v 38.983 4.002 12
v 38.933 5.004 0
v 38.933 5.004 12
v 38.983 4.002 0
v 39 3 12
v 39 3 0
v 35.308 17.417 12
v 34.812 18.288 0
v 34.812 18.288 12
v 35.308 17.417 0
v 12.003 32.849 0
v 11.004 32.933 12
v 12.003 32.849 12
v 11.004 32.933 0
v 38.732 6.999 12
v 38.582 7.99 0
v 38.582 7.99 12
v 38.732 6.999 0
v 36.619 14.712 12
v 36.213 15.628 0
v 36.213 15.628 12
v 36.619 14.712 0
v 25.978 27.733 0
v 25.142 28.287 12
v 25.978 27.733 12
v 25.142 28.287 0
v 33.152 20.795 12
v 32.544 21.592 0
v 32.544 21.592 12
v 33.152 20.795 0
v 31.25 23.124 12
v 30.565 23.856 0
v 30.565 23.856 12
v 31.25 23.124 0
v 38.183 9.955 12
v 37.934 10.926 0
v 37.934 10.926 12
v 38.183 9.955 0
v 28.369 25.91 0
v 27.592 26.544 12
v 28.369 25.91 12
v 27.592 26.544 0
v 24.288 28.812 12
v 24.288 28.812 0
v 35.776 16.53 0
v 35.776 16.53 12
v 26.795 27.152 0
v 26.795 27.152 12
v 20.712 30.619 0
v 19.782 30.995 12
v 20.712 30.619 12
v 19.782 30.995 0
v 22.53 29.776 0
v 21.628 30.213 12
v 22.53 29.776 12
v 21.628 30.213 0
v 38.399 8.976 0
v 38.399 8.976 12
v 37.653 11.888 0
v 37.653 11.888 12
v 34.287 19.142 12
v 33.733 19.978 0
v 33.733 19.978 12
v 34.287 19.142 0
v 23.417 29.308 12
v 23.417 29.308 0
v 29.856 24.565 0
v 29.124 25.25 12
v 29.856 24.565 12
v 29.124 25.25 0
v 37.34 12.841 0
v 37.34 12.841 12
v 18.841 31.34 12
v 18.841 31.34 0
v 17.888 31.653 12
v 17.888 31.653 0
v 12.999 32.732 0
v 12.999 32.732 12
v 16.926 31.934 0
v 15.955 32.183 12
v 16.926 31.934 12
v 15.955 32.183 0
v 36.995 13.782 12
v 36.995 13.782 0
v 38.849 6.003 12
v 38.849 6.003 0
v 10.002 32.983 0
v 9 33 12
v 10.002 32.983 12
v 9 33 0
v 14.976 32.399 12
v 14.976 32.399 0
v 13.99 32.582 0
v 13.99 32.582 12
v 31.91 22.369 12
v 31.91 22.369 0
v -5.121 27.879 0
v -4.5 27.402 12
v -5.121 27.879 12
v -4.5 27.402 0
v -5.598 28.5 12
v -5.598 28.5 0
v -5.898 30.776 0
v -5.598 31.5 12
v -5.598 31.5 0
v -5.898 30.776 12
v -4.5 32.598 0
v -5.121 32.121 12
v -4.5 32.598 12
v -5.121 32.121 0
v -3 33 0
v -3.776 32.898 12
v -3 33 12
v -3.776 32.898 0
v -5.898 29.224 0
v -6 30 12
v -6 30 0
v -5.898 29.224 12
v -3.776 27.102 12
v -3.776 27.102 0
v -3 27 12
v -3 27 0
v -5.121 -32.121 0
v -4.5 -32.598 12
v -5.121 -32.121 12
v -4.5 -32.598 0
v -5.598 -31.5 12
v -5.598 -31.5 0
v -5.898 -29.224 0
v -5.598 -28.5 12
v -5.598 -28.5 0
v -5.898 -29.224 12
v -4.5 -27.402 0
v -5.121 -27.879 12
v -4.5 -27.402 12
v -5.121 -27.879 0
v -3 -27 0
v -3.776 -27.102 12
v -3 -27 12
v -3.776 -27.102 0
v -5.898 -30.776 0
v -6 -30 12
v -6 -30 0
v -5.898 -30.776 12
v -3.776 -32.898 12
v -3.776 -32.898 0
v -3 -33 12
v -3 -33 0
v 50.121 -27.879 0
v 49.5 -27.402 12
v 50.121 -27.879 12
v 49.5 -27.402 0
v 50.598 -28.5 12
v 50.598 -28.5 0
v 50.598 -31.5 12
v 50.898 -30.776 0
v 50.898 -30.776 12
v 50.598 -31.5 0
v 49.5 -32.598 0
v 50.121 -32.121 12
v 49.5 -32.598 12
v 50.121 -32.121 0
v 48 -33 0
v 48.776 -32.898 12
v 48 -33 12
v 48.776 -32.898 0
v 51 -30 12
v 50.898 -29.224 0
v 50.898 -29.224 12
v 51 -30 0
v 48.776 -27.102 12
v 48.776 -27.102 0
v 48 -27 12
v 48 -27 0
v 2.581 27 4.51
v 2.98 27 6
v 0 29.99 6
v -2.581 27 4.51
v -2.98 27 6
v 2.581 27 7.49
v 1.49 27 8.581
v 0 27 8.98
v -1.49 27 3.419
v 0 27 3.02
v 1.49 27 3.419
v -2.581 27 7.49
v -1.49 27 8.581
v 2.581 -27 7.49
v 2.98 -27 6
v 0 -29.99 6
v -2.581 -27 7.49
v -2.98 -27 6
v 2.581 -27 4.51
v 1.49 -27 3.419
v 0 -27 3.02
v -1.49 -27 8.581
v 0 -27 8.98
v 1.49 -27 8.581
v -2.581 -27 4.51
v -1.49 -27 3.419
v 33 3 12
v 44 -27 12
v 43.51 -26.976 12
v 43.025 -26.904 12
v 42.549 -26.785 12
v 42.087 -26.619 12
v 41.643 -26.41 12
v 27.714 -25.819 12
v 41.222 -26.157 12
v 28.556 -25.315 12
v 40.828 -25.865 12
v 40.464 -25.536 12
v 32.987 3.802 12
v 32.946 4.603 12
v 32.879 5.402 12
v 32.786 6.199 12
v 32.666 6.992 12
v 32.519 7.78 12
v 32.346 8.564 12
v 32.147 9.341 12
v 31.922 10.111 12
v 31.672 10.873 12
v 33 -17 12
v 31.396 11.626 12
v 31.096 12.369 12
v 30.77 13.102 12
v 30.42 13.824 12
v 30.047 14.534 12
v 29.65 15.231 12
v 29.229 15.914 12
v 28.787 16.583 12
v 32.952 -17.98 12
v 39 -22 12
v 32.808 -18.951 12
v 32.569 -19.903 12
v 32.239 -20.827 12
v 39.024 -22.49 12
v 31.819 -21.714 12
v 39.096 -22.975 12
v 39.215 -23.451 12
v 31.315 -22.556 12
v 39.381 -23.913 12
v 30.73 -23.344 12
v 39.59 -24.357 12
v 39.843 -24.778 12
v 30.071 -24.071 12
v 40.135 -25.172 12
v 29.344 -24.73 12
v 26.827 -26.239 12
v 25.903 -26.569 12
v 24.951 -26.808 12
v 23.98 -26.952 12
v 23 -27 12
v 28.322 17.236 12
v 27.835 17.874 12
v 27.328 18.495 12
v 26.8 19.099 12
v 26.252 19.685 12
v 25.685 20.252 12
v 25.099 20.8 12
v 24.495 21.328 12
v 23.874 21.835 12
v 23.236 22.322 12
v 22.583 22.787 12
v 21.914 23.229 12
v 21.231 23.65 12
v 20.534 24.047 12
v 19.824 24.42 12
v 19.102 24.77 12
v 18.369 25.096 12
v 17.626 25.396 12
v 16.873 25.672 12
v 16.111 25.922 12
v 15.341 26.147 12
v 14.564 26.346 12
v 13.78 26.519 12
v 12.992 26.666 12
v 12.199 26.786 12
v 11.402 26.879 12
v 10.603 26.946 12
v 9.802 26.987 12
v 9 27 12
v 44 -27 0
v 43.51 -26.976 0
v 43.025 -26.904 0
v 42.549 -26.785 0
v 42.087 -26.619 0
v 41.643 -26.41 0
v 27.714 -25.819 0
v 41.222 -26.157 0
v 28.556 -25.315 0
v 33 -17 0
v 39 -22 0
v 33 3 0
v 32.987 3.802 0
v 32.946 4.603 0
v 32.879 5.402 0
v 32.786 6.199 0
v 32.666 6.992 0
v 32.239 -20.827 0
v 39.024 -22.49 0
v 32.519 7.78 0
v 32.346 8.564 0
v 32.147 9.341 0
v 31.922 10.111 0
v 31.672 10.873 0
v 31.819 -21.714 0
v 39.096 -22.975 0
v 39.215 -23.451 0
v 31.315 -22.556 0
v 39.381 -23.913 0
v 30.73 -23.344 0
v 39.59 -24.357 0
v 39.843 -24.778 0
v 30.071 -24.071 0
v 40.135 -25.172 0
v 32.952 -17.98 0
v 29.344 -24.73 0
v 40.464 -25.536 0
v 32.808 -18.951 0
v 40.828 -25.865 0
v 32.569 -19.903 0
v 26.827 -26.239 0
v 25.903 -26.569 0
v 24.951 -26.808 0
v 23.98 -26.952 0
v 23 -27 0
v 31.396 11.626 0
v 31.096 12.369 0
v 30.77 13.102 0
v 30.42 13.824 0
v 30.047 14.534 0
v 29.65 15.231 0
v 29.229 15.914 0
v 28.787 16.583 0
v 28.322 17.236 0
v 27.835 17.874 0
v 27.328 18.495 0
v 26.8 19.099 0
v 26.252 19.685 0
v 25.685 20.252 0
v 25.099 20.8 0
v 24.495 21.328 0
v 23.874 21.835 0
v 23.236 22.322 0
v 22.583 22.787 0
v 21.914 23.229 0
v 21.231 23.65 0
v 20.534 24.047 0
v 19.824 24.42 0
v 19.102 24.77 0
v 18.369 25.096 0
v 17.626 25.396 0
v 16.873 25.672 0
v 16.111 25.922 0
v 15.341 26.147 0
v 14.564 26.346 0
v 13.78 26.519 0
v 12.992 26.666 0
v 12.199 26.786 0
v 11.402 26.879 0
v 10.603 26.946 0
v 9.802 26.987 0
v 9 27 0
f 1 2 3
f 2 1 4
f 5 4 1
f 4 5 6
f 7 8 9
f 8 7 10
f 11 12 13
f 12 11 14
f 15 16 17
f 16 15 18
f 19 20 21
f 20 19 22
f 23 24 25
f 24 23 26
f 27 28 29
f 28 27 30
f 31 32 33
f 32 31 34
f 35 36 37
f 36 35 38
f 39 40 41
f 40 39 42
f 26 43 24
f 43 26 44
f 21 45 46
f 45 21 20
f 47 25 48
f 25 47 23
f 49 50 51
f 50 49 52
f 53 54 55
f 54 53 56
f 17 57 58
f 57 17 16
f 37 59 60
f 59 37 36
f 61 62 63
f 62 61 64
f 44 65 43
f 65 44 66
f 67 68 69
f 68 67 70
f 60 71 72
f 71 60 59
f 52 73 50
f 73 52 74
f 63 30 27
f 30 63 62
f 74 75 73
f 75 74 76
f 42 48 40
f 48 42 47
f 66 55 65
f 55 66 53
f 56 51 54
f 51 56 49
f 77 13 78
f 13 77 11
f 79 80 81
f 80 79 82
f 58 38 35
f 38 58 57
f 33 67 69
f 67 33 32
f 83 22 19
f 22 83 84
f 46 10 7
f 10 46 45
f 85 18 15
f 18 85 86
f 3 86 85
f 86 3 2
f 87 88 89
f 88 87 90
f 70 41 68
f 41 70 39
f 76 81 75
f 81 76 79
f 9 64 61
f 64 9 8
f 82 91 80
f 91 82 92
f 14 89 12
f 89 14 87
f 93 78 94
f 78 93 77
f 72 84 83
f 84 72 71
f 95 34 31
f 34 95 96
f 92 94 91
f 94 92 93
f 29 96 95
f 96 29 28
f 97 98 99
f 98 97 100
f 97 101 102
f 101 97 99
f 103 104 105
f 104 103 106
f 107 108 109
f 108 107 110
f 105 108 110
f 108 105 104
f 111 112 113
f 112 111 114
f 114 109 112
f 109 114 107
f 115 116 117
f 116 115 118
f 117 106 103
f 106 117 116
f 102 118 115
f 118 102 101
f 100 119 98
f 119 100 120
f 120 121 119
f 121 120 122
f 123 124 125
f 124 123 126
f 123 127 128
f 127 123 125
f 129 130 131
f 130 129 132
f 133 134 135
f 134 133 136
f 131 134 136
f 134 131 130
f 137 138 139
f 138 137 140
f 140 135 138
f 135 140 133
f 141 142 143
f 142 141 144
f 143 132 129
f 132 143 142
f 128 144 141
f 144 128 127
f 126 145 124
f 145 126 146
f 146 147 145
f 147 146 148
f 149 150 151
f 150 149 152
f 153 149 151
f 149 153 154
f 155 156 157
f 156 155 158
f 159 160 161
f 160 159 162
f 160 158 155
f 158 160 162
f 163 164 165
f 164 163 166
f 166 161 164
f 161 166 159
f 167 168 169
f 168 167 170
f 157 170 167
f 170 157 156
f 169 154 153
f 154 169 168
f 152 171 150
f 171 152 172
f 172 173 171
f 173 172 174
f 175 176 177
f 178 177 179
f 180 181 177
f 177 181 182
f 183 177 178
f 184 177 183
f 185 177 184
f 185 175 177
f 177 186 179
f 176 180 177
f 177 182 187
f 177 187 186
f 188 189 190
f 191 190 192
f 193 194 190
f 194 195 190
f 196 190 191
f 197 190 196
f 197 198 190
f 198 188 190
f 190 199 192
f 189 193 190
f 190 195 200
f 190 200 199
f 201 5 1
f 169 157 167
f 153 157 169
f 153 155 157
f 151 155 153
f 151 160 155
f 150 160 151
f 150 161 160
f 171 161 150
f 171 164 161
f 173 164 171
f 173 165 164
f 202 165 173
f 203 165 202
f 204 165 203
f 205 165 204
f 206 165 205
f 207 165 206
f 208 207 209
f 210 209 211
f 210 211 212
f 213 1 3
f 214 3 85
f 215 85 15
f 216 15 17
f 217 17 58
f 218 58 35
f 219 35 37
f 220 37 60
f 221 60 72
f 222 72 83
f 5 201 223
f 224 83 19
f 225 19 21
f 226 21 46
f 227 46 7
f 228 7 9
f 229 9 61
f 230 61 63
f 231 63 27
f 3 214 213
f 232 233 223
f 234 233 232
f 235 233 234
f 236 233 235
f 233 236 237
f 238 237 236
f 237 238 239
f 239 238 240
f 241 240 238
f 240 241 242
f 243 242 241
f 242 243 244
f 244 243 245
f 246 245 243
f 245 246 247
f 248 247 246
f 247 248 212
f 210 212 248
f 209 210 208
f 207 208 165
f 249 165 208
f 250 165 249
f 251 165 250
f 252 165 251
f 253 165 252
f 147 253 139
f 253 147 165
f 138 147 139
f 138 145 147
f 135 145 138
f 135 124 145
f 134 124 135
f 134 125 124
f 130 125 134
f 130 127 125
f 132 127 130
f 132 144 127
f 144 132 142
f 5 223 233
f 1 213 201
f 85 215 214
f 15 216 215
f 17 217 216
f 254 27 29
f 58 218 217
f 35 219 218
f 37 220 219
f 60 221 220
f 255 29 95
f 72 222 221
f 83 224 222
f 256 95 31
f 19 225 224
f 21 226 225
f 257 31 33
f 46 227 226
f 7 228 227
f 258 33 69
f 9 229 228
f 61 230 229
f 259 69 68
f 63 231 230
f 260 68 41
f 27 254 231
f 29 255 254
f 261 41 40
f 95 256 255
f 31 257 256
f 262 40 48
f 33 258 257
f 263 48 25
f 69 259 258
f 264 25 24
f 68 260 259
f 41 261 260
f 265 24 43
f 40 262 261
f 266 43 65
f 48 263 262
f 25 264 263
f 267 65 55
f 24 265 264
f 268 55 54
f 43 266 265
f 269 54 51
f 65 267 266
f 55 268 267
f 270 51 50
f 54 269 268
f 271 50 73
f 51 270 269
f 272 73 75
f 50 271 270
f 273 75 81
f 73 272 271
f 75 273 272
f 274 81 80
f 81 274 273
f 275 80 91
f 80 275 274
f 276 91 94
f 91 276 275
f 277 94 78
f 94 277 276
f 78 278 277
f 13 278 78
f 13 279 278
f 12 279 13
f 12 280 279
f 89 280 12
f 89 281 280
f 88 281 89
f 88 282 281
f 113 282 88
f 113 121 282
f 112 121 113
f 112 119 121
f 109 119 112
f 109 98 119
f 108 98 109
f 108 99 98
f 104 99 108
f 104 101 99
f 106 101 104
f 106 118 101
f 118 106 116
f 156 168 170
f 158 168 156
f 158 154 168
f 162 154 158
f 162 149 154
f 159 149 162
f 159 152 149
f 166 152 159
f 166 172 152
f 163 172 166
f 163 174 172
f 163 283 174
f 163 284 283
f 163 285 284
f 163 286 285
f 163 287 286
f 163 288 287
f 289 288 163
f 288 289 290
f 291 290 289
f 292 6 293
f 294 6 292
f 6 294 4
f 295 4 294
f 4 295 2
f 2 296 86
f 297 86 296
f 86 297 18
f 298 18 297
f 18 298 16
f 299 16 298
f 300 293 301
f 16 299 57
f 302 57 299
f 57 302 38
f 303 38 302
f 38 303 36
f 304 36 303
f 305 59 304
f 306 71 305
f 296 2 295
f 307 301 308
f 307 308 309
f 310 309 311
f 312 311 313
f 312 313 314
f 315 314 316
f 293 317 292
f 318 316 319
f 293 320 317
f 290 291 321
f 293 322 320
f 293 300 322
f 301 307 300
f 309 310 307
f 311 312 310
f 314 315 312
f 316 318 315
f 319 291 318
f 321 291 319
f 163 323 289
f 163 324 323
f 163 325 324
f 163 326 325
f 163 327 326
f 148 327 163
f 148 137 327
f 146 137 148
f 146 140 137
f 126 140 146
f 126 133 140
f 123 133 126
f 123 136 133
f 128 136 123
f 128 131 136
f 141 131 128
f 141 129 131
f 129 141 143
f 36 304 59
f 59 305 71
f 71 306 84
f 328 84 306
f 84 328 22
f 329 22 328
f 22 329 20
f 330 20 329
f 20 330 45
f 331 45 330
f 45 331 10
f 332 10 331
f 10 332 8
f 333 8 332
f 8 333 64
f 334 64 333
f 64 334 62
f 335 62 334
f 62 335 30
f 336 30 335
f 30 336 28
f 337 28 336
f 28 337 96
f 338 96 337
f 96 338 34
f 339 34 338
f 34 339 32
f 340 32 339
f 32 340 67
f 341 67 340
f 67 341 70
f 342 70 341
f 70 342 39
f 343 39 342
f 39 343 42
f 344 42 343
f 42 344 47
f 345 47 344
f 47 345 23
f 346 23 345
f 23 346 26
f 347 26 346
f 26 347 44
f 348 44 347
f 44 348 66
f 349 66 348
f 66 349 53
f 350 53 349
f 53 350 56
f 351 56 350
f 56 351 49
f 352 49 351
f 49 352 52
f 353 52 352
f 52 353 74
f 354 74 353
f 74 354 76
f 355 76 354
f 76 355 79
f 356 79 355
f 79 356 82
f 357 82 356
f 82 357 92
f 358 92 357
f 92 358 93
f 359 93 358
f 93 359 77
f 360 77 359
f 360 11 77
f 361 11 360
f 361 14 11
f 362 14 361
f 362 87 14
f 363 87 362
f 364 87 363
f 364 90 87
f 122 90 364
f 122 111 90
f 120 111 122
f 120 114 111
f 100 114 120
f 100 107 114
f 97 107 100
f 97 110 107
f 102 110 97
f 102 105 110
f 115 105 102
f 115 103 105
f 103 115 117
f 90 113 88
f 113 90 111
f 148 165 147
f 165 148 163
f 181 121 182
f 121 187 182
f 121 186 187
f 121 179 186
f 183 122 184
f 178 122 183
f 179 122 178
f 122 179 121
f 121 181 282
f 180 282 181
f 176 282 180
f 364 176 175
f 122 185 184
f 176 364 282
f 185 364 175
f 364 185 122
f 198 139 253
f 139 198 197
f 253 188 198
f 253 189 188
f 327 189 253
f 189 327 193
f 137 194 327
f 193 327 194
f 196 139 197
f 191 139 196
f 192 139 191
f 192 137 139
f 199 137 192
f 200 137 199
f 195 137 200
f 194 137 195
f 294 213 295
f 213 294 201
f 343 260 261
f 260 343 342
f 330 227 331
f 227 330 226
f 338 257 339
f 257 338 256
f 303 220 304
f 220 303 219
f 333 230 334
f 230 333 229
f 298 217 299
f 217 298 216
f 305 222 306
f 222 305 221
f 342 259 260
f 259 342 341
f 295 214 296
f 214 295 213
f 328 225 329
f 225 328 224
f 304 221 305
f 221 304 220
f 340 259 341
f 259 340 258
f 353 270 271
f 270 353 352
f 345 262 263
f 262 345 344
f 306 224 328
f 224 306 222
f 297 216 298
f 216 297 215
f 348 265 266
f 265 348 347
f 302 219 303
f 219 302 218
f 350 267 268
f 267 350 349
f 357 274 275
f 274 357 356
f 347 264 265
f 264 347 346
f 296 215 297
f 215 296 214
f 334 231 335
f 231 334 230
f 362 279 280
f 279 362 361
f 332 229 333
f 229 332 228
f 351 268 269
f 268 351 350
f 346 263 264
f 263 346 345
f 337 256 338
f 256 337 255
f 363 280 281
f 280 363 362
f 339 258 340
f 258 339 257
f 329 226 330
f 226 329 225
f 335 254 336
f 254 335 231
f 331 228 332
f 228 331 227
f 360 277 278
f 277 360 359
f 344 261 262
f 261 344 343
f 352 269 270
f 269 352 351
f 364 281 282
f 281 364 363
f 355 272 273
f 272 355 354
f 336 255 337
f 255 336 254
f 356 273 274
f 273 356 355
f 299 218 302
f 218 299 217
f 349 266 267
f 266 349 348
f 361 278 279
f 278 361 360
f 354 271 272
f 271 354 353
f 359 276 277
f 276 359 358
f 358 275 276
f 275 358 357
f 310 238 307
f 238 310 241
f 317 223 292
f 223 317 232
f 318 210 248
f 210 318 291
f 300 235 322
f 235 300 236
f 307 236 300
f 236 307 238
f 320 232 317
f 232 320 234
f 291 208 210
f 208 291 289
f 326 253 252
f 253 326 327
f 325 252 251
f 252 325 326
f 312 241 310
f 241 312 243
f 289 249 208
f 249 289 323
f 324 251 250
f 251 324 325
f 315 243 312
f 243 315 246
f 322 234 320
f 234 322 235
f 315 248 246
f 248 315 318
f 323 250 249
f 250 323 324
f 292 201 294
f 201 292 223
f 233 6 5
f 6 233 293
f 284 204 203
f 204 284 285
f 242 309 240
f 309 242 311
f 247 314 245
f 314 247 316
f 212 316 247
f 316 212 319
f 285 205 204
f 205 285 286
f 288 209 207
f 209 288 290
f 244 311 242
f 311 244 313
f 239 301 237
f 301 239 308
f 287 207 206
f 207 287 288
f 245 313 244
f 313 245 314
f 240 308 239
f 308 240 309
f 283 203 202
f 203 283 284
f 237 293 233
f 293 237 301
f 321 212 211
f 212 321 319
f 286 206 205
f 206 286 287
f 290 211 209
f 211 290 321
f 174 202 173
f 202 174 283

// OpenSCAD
//Customizable Gimbal Mount to put a Spinning Shape in
//7/21/2015     By: David Bunch
//
//Initially made to spin this shape: http://www.thingiverse.com/thing:543083
//
//CUSTOMIZER VARIABLES

//1. Length Between Gimbal Points
GimbalDistance = 60;

//2. Inside Width Clearance Distance
PivotThroat = 33;

//3. Diameter of Pivot Point
PivotDia = 6;

//4. Thickness of Part
Thickness = 6;

//5. Height of Part
Ht = 12;

//6. Resolution of Pivot Points
iresPiv = 12;

//7. Resolution of Larger Curves
iresBig = 188;

//8. Resolution of Smaller Curves
iresSmall = 64;

//9. Resolution of Round Corners
iresRnd = 24;

//CUSTOMIZER VARIABLES END

PivRad = PivotDia / 2;
Thk2 = Thickness / 2;
G2 = GimbalDistance / 2;
Piv_Y = G2 - Thk2 - .01;
//Initial Cube to cut from
Len = GimbalDistance + Thickness;
Wid = PivRad + PivotThroat + Thickness + 9 + Thickness;
Cube_Y = G2 + Thk2;
Cube_X =  PivRad + Thk2;
//Cube portion at Gimbal Throat full length
Cut1Len = Len - (Thickness * 2);
Cut1Wid = (PivotThroat - 24) + PivRad + Thickness;
Cut1_X = PivRad + Thickness;
Cut1_Y = G2 - Thk2;
//Cut largest Cylinder inside cut at top Right
CutCyl1_X = PivotThroat - 24;
CutCyl1_Y = G2 - Thk2 - 24;
//Cut Smallest Cylinder inside cut at bottom right
CutCyl2_X = PivotThroat - 10;
CutCyl2_Y = Cut1_Y - 10;
//Inside Bottom Cube Cut from Center of pivot to edge of bottom cylinder cut
Cube2Len=11;
Cube2Wid=PivotThroat;
Cut2_X = -10;
//Inside Bottom Cube Cut 
Cube3Len = CutCyl1_Y + CutCyl2_Y;
Cube3Wid = PivotThroat;
Cut3_X = 0;
Cut3_Y = CutCyl2_Y;
//Outside Top Cube
Cube4Wid = 9 + Thickness;
Cube4Len = Len;
Cut4_X = PivotThroat + Thickness;
//Outisde Bottom Cylinder Cut
CutCyl3_X = PivotThroat + Thickness + 5;
CutCyl3_Y = G2 - Thk2 - 5;
//Outside Bottom cut of Cylinder
Cube5Wid = 20;
Cube5Len = 20;
Cut5_X = PivotThroat + Thickness+5;
Cut5_Y = G2 - Thk2;
//Outside Top cut of Cylinder
Cube6Wid = 10;
Cube6Len = 20;
Cut6_X = PivotThroat + Thickness;
Cut6_Y = G2 - Thk2 - 5;
//Outside Top Cube for Cutting
Cube7Wid = 24 + Thickness + 5;
Cube7Len = 24 + Thickness + 5;
//Round Corners variables
RndCornLen = Thickness * 2;
RndCornWid = Thickness * 2;
RndCorn_X = RndCornLen;
RndCorn_Y = RndCornWid / 2;
XLoc1 = PivRad;
YLoc1 = Cube_Y - Thk2;
XLoc2 = PivotThroat + Thickness + 9;
module CutOutTopCyl()
{
    difference()
    {
        translate([CutCyl1_X,CutCyl1_Y,-1])
        cube([Cube7Wid,Cube7Len,Ht+2]);
        translate([CutCyl1_X,CutCyl1_Y,-2])
        cylinder(d=48 + (Thickness * 2),h=Ht+4,$fn=iresBig);
    }
}
module RoundCorners()
{
    difference()
    {
        translate([-RndCorn_X,-RndCorn_Y,-1])
        cube([RndCornWid,RndCornLen,Ht+2]);
        translate([0,0,-2])
        cylinder(d=Thickness,h=Ht+4,$fn=iresRnd);
    }
}
module Indent()
{
    translate([0,0,-.01])
    cylinder(d1=PivotDia,d2=0,h=(PivotDia / 2) + .01,$fn=iresPiv);
    translate([0,0,-2])
    cylinder(d=PivotDia,h=2,$fn=iresPiv);
}
module Gimbal()
{
    difference()
    {
//Initial Cube to cut from
        translate([-Cube_X,-Cube_Y,0])
        cube([Wid,Len,Ht]);
//Cube portion at Gimbal Throat full length
        translate([-Cut1_X,-Cut1_Y,-1])
        cube([Cut1Wid,Cut1Len,Ht+2]);
//Cut largest Cylinder inside cut at top Right
        translate([CutCyl1_X,CutCyl1_Y,-1])
        cylinder(d=48,h=Ht+2,$fn=iresBig);
//Cut Smallest Cylinder inside cut at bottom right
        translate([CutCyl2_X,-CutCyl2_Y,-1])
        cylinder(d=20,h=Ht+2,$fn=iresSmall);
//Inside Bottom Cube Cut from Center of pivot to edge of bottom cylinder cut
        translate([Cut2_X,-Cut1_Y,-1])
        cube([Cube2Wid,Cube2Len,Ht+2]);
//Inside Bottom Cube Cut 
        translate([Cut3_X,-Cut3_Y,-1])
        cube([Cube3Wid,Cube3Len,Ht+2]);
//Outside Top Cube Cut 
        translate([Cut4_X,-Cut3_Y,-1])
        cube([Cube4Wid,Cube4Len,Ht+2]);
//Outside Bottom Cylinder Cut 
        translate([CutCyl3_X,-CutCyl3_Y,-1])
        cylinder(d=10,h=Ht+2,$fn=iresSmall);
//Outside Bottom Cube Cut 
        translate([Cut5_X,-Cut5_Y,-1])
        cube([Cube5Wid,Cube5Len,Ht+2]);
//Outside Bottom Cube Cut 
        translate([Cut6_X,-Cut6_Y,-1])
        cube([Cube6Wid,Cube6Len,Ht+2]);
//Cut the Outside Top Curve
        CutOutTopCyl();
//Round the 3 end Points of Gimbal
        translate([-XLoc1,YLoc1,0])
        RoundCorners();
        translate([-XLoc1,-YLoc1,0])
        RoundCorners();
        translate([XLoc2,-YLoc1,0])
        rotate([0,0,180])
        RoundCorners();
//Cut out the Gimbal pivot points
        translate([0,Piv_Y,Ht/2])
        rotate([-90,0,0])
        Indent();
        translate([0,-Piv_Y,Ht/2])
        rotate([90,0,0])
        Indent();
    }
}
//Draw the Final Part
Gimbal();
